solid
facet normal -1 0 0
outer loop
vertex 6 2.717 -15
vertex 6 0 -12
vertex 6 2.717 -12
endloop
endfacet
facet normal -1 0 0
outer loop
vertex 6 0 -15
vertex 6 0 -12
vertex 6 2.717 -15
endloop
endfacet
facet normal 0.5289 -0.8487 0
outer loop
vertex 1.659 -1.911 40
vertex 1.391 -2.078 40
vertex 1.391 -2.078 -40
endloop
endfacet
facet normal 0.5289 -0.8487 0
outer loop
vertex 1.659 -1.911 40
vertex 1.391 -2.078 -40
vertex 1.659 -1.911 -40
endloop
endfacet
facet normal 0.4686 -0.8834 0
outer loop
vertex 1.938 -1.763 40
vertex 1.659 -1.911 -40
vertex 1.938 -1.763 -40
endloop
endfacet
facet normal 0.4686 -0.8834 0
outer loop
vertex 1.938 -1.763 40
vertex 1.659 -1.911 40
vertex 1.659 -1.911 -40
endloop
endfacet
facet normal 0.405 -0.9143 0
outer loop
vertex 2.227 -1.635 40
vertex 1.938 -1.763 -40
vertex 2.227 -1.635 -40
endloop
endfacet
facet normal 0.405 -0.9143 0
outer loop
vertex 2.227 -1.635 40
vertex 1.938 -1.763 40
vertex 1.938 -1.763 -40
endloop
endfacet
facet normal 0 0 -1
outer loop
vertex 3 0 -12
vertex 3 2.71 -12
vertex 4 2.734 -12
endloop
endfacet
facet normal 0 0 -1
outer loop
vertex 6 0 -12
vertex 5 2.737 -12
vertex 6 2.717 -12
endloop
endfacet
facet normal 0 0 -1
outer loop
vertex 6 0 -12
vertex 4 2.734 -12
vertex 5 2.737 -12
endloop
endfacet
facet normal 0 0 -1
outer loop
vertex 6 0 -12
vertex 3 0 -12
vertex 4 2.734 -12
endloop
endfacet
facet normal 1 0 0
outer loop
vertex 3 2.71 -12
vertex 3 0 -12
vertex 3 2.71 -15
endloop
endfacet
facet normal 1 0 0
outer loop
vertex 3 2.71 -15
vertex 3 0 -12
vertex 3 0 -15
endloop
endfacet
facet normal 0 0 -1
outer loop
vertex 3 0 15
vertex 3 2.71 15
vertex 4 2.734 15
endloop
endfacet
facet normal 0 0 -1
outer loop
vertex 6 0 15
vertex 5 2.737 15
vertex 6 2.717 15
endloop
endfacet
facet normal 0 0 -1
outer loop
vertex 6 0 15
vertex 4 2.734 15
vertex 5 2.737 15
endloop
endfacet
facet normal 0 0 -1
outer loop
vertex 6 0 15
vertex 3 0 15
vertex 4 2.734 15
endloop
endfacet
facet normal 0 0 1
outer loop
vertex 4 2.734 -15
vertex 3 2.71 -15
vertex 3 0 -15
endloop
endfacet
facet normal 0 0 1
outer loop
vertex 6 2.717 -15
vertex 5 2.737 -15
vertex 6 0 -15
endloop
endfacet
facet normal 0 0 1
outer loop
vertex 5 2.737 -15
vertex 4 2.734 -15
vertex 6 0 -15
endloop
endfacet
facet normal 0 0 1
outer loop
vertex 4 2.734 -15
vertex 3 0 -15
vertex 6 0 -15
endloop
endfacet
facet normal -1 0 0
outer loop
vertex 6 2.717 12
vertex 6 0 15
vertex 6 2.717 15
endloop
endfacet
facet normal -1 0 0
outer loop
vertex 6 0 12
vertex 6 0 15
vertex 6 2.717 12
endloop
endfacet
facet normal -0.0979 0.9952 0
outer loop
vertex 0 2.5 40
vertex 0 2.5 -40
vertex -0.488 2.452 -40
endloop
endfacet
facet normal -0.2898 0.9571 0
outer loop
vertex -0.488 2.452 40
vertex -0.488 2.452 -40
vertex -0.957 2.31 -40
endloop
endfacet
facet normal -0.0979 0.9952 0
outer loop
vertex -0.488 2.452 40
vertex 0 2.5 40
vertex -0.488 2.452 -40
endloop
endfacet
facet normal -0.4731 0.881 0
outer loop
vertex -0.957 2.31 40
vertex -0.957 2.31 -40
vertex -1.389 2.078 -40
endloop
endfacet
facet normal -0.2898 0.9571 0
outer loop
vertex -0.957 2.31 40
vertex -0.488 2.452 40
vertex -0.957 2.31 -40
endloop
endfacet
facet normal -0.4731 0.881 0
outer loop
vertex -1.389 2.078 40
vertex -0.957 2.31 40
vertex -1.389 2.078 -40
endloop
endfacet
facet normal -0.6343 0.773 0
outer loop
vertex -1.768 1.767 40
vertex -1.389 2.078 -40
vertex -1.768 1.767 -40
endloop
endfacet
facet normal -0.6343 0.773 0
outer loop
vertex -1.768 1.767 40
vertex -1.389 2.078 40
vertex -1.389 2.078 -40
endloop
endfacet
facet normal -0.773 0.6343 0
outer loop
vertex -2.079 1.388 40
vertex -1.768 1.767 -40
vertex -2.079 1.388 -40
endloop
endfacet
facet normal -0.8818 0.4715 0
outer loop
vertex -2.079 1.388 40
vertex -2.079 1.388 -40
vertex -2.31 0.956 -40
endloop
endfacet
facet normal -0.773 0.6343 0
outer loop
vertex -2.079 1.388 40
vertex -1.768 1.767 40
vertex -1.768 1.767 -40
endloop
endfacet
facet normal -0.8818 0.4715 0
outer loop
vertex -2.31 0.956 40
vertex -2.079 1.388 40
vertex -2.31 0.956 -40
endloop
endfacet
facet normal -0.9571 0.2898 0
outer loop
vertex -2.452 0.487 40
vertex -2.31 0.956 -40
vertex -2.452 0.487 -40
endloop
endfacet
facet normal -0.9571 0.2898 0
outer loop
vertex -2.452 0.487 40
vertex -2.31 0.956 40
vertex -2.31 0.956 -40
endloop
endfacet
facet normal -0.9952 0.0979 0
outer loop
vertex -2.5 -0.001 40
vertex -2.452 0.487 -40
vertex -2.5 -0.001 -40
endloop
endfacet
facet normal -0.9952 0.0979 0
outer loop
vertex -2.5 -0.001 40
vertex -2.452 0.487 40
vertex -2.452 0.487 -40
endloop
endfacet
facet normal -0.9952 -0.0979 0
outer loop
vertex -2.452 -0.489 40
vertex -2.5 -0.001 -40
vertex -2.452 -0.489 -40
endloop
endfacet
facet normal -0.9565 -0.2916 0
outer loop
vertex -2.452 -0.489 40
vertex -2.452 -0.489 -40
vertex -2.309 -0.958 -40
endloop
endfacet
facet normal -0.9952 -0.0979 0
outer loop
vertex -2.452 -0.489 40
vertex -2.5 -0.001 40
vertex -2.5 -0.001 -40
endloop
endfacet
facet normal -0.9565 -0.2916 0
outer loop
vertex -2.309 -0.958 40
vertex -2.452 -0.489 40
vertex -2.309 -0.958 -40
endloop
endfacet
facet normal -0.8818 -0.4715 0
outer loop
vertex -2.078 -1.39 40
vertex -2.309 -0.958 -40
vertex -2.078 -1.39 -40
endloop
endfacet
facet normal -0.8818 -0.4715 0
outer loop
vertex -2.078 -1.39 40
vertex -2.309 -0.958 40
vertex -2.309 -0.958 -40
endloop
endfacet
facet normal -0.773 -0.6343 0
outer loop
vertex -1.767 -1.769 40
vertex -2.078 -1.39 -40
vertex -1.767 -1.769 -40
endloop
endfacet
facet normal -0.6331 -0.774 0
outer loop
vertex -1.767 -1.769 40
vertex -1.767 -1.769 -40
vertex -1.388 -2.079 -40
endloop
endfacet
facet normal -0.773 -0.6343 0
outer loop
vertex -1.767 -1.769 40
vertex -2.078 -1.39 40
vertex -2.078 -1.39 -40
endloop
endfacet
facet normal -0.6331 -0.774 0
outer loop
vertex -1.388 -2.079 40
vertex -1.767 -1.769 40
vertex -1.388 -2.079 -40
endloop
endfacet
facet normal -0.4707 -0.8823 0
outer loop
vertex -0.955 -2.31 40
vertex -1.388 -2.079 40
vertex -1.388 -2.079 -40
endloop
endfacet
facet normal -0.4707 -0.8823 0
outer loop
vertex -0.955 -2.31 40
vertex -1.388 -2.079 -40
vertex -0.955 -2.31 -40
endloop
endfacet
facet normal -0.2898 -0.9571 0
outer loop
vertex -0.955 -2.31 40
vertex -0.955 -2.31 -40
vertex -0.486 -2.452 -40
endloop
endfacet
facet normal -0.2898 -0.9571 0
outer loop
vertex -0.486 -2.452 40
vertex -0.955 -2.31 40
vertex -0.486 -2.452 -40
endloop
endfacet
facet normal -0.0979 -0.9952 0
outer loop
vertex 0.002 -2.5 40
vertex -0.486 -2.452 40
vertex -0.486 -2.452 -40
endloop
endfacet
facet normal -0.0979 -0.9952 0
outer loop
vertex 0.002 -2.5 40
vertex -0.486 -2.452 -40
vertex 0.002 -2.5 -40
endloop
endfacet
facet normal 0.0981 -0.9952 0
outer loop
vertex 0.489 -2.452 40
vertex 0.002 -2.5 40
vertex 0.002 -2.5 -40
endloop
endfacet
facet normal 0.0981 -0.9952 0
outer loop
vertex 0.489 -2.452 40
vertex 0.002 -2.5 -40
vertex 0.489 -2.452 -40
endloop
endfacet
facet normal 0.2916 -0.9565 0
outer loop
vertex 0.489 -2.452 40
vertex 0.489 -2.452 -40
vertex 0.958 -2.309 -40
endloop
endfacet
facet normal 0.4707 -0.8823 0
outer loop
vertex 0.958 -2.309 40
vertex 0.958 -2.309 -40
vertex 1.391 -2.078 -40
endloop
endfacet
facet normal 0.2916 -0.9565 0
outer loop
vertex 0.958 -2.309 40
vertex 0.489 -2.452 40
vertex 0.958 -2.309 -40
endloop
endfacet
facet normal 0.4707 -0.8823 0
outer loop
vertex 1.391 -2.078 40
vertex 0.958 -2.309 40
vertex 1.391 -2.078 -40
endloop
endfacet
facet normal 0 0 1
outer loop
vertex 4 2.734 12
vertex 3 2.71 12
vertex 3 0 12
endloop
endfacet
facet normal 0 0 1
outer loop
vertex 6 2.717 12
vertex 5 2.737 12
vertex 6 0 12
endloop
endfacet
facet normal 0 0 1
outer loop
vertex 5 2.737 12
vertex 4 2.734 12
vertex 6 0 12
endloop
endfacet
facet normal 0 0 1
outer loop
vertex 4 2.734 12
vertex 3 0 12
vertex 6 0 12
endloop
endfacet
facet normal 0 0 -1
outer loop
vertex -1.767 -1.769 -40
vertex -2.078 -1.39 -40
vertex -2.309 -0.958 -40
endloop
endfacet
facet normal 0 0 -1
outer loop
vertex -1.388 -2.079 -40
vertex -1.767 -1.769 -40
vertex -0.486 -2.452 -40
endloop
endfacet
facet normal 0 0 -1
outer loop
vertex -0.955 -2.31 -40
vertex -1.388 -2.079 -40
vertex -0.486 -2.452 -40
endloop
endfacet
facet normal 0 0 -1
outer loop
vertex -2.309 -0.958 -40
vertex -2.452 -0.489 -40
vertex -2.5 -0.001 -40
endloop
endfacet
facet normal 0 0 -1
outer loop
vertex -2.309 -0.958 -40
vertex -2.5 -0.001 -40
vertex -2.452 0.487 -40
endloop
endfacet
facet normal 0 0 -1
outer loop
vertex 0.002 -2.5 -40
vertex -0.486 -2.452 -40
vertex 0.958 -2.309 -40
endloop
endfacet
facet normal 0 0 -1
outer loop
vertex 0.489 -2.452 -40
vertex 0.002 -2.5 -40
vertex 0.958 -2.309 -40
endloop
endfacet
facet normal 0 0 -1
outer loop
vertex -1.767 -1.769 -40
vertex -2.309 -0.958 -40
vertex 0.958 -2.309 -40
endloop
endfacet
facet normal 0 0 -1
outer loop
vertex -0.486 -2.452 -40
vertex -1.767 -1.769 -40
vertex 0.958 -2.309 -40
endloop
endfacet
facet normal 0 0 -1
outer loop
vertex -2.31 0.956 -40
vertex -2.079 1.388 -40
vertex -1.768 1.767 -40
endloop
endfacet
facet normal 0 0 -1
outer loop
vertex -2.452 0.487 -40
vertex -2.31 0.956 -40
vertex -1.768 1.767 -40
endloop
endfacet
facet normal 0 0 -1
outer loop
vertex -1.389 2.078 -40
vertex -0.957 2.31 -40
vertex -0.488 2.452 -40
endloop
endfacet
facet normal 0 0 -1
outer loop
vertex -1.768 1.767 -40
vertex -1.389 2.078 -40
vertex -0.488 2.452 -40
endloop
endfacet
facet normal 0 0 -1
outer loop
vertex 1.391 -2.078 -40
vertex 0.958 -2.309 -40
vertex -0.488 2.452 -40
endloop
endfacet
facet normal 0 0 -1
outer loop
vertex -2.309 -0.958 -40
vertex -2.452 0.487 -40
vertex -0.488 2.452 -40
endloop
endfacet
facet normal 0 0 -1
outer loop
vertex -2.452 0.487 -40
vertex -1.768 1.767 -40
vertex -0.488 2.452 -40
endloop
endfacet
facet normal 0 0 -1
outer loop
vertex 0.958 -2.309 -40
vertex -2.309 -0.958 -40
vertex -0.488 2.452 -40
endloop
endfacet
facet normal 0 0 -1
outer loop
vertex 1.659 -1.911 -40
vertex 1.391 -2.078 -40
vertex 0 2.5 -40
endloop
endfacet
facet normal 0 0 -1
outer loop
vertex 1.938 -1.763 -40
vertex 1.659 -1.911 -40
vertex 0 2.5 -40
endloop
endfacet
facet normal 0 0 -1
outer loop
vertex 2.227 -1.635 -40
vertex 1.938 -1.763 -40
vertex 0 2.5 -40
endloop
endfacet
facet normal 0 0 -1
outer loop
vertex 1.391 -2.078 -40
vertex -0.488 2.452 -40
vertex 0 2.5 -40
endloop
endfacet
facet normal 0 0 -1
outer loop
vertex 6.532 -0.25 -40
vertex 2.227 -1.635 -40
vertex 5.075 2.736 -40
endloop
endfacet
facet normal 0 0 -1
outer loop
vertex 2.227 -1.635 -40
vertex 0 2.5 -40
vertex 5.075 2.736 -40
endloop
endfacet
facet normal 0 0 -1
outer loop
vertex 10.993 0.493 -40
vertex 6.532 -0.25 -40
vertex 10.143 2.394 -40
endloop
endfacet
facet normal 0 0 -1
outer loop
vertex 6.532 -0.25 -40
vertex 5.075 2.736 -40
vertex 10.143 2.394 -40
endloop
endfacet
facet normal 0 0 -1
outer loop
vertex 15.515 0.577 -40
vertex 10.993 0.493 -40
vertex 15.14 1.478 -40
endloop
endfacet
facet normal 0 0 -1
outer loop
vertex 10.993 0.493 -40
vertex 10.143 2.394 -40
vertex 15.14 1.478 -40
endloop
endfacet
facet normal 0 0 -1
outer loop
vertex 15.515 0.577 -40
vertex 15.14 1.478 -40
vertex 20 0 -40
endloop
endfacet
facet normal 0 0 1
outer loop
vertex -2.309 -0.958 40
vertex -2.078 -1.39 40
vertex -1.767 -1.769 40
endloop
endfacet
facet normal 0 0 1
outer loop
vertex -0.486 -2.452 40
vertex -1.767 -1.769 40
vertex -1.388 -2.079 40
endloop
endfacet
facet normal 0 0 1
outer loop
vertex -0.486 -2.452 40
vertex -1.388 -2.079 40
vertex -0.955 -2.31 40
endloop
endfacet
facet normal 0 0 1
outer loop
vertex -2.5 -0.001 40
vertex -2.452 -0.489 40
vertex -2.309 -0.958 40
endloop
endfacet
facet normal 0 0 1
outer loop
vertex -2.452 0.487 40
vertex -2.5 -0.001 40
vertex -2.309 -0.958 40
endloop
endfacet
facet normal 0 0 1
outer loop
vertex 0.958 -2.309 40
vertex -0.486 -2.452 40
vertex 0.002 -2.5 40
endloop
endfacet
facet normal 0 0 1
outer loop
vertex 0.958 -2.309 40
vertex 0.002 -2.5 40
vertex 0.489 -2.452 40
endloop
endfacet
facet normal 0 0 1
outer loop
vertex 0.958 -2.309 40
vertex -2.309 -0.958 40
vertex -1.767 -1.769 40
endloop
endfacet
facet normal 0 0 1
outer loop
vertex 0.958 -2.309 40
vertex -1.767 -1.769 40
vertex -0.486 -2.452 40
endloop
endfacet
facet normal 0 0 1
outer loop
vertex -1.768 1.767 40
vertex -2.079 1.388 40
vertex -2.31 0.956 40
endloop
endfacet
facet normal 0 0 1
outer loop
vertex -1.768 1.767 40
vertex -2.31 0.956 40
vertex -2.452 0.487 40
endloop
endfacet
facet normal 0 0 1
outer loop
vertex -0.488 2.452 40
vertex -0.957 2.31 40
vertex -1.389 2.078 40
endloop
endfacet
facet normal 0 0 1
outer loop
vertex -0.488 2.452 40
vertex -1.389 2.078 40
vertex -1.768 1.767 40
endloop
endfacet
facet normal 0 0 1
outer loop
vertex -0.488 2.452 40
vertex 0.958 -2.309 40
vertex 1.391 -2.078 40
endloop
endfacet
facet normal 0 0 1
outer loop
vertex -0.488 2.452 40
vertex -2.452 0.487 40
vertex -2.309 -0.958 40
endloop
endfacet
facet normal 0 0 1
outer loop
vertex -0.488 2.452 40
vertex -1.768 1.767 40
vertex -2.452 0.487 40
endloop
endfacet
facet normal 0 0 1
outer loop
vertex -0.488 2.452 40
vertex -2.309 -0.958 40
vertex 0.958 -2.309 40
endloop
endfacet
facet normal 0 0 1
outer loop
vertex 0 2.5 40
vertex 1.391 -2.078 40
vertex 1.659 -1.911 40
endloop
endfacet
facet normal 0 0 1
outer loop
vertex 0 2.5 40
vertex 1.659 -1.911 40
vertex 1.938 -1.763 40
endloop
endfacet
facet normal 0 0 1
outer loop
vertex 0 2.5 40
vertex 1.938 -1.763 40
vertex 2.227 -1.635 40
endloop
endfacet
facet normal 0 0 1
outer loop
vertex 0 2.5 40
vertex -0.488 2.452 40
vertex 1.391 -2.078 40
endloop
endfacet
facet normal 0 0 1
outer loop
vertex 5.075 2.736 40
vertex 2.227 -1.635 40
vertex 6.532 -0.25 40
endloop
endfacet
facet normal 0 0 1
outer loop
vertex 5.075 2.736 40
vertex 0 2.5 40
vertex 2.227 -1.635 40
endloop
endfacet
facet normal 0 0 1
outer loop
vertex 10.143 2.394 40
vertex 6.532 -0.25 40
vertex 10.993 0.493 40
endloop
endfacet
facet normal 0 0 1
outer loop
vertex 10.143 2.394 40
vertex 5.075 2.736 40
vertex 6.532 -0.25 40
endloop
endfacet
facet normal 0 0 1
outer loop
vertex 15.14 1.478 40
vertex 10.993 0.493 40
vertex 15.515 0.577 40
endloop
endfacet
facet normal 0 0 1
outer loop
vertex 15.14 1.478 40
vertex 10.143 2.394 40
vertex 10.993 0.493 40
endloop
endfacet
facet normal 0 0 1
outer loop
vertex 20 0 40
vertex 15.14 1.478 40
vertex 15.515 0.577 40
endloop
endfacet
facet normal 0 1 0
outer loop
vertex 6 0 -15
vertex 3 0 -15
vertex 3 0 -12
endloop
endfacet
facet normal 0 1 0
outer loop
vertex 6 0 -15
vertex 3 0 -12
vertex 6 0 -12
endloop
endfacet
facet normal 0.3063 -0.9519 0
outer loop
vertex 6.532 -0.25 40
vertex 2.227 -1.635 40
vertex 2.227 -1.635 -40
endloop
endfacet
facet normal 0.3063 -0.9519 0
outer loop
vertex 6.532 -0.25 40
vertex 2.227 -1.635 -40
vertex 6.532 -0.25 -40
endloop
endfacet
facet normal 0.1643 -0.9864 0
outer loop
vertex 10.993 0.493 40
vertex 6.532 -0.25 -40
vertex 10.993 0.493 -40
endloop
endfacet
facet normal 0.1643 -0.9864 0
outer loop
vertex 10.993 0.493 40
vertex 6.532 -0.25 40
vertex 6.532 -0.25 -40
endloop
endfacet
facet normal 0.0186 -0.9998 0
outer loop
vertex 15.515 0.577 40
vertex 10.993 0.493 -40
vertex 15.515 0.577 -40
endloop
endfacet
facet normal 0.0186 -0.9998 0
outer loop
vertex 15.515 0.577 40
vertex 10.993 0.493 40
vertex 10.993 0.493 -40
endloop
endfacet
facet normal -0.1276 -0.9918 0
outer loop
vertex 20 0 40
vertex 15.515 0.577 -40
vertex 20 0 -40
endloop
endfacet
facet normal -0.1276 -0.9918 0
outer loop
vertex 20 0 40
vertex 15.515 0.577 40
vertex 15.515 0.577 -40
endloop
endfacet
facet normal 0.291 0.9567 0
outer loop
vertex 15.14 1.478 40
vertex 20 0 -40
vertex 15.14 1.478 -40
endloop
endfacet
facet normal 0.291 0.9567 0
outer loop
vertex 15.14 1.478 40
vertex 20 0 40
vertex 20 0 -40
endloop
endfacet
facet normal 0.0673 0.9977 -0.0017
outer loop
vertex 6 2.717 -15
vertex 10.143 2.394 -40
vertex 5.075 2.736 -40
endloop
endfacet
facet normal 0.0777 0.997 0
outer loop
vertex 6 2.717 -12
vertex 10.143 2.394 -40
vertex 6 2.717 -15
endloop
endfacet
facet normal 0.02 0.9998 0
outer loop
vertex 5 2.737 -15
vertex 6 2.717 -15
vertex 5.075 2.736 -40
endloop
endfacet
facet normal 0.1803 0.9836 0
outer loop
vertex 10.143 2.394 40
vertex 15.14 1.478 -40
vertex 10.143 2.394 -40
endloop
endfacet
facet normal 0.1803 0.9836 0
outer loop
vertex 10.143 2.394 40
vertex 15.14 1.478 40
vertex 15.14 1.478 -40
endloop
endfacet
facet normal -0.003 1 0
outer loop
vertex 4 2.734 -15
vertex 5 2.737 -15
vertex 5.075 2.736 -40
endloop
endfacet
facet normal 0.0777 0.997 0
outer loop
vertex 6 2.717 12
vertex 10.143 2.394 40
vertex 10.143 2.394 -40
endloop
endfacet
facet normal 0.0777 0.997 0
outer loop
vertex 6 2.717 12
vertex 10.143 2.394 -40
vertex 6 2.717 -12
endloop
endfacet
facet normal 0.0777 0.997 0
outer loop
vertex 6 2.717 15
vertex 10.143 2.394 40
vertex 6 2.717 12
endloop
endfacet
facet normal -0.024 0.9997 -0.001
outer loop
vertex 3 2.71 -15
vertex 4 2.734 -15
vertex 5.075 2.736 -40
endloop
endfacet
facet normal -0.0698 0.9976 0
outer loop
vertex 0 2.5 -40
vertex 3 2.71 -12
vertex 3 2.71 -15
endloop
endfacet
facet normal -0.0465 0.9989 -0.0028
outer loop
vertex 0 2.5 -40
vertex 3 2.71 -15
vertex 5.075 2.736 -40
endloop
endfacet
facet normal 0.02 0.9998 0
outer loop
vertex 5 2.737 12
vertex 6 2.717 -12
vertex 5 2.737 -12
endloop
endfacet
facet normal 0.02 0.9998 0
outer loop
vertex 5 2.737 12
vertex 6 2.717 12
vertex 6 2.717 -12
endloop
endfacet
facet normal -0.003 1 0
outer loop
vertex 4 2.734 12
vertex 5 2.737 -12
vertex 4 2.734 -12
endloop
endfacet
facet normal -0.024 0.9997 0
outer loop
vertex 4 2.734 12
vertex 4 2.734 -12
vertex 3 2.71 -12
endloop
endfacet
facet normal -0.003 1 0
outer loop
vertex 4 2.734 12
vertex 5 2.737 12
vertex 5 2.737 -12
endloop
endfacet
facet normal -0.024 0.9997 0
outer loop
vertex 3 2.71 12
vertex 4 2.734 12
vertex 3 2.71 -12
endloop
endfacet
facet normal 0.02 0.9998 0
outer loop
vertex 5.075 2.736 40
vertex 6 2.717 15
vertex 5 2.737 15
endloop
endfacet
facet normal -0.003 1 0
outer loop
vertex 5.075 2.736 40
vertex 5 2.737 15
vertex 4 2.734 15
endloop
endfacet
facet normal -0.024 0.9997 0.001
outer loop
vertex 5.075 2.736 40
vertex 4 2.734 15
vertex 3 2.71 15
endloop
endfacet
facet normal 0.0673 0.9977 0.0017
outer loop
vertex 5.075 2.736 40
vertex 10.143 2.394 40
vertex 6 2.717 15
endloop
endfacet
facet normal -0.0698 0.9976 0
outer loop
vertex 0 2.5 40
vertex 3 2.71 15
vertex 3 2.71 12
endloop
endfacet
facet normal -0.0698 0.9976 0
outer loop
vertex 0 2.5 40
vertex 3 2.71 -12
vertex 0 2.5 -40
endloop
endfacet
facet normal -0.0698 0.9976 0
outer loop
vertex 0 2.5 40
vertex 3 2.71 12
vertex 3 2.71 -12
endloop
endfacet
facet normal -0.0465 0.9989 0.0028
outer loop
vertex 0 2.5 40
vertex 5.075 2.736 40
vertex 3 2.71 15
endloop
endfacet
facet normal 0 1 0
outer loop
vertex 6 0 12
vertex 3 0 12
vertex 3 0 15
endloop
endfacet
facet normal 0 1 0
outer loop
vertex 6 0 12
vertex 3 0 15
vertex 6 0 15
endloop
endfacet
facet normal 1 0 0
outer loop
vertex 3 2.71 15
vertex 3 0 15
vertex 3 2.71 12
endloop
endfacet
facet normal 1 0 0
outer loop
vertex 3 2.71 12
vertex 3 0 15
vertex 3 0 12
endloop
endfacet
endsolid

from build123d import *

# Parameters (mm, degrees)
BOSS_EXTRUDE2_DEPTH = 40
SKETCH3_W           = 3
SKETCH3_H           = 3
CUT_EXTRUDE2_DEPTH  = 45.805132264


with BuildPart() as part:
    # Sketch1 → Boss-Extrude2 (new, symmetric)
    with BuildSketch(Plane.XY):
        with BuildLine():
            ThreePointArc((0, 2.5), (-2.392060476, -0.726668205), (1.390587434, -2.077562656))
            ThreePointArc((1.390587434, -2.077562656), (1.797326731, -1.834582069), (2.226834249, -1.634582786))
            ThreePointArc((2.226834249, -1.634582786), (10.992934155, 0.492745515), (20, 0))
            ThreePointArc((20, 0), (10.143001238, 2.394009907), (0, 2.5))
        make_face()
    extrude(amount=BOSS_EXTRUDE2_DEPTH, both=True)

    # Sketch3 → Cut-Extrude2 (cut, through all)
    with BuildSketch(Plane(origin=(0, 0, 0), x_dir=(1, 0, 0), z_dir=(0, 1, 0))):
        with Locations((4.5, -13.5)):
            Rectangle(SKETCH3_W, SKETCH3_H)
        with Locations((4.5, 13.5)):
            Rectangle(SKETCH3_W, SKETCH3_H)
    extrude(amount=CUT_EXTRUDE2_DEPTH, mode=Mode.SUBTRACT)


solid = part.part
